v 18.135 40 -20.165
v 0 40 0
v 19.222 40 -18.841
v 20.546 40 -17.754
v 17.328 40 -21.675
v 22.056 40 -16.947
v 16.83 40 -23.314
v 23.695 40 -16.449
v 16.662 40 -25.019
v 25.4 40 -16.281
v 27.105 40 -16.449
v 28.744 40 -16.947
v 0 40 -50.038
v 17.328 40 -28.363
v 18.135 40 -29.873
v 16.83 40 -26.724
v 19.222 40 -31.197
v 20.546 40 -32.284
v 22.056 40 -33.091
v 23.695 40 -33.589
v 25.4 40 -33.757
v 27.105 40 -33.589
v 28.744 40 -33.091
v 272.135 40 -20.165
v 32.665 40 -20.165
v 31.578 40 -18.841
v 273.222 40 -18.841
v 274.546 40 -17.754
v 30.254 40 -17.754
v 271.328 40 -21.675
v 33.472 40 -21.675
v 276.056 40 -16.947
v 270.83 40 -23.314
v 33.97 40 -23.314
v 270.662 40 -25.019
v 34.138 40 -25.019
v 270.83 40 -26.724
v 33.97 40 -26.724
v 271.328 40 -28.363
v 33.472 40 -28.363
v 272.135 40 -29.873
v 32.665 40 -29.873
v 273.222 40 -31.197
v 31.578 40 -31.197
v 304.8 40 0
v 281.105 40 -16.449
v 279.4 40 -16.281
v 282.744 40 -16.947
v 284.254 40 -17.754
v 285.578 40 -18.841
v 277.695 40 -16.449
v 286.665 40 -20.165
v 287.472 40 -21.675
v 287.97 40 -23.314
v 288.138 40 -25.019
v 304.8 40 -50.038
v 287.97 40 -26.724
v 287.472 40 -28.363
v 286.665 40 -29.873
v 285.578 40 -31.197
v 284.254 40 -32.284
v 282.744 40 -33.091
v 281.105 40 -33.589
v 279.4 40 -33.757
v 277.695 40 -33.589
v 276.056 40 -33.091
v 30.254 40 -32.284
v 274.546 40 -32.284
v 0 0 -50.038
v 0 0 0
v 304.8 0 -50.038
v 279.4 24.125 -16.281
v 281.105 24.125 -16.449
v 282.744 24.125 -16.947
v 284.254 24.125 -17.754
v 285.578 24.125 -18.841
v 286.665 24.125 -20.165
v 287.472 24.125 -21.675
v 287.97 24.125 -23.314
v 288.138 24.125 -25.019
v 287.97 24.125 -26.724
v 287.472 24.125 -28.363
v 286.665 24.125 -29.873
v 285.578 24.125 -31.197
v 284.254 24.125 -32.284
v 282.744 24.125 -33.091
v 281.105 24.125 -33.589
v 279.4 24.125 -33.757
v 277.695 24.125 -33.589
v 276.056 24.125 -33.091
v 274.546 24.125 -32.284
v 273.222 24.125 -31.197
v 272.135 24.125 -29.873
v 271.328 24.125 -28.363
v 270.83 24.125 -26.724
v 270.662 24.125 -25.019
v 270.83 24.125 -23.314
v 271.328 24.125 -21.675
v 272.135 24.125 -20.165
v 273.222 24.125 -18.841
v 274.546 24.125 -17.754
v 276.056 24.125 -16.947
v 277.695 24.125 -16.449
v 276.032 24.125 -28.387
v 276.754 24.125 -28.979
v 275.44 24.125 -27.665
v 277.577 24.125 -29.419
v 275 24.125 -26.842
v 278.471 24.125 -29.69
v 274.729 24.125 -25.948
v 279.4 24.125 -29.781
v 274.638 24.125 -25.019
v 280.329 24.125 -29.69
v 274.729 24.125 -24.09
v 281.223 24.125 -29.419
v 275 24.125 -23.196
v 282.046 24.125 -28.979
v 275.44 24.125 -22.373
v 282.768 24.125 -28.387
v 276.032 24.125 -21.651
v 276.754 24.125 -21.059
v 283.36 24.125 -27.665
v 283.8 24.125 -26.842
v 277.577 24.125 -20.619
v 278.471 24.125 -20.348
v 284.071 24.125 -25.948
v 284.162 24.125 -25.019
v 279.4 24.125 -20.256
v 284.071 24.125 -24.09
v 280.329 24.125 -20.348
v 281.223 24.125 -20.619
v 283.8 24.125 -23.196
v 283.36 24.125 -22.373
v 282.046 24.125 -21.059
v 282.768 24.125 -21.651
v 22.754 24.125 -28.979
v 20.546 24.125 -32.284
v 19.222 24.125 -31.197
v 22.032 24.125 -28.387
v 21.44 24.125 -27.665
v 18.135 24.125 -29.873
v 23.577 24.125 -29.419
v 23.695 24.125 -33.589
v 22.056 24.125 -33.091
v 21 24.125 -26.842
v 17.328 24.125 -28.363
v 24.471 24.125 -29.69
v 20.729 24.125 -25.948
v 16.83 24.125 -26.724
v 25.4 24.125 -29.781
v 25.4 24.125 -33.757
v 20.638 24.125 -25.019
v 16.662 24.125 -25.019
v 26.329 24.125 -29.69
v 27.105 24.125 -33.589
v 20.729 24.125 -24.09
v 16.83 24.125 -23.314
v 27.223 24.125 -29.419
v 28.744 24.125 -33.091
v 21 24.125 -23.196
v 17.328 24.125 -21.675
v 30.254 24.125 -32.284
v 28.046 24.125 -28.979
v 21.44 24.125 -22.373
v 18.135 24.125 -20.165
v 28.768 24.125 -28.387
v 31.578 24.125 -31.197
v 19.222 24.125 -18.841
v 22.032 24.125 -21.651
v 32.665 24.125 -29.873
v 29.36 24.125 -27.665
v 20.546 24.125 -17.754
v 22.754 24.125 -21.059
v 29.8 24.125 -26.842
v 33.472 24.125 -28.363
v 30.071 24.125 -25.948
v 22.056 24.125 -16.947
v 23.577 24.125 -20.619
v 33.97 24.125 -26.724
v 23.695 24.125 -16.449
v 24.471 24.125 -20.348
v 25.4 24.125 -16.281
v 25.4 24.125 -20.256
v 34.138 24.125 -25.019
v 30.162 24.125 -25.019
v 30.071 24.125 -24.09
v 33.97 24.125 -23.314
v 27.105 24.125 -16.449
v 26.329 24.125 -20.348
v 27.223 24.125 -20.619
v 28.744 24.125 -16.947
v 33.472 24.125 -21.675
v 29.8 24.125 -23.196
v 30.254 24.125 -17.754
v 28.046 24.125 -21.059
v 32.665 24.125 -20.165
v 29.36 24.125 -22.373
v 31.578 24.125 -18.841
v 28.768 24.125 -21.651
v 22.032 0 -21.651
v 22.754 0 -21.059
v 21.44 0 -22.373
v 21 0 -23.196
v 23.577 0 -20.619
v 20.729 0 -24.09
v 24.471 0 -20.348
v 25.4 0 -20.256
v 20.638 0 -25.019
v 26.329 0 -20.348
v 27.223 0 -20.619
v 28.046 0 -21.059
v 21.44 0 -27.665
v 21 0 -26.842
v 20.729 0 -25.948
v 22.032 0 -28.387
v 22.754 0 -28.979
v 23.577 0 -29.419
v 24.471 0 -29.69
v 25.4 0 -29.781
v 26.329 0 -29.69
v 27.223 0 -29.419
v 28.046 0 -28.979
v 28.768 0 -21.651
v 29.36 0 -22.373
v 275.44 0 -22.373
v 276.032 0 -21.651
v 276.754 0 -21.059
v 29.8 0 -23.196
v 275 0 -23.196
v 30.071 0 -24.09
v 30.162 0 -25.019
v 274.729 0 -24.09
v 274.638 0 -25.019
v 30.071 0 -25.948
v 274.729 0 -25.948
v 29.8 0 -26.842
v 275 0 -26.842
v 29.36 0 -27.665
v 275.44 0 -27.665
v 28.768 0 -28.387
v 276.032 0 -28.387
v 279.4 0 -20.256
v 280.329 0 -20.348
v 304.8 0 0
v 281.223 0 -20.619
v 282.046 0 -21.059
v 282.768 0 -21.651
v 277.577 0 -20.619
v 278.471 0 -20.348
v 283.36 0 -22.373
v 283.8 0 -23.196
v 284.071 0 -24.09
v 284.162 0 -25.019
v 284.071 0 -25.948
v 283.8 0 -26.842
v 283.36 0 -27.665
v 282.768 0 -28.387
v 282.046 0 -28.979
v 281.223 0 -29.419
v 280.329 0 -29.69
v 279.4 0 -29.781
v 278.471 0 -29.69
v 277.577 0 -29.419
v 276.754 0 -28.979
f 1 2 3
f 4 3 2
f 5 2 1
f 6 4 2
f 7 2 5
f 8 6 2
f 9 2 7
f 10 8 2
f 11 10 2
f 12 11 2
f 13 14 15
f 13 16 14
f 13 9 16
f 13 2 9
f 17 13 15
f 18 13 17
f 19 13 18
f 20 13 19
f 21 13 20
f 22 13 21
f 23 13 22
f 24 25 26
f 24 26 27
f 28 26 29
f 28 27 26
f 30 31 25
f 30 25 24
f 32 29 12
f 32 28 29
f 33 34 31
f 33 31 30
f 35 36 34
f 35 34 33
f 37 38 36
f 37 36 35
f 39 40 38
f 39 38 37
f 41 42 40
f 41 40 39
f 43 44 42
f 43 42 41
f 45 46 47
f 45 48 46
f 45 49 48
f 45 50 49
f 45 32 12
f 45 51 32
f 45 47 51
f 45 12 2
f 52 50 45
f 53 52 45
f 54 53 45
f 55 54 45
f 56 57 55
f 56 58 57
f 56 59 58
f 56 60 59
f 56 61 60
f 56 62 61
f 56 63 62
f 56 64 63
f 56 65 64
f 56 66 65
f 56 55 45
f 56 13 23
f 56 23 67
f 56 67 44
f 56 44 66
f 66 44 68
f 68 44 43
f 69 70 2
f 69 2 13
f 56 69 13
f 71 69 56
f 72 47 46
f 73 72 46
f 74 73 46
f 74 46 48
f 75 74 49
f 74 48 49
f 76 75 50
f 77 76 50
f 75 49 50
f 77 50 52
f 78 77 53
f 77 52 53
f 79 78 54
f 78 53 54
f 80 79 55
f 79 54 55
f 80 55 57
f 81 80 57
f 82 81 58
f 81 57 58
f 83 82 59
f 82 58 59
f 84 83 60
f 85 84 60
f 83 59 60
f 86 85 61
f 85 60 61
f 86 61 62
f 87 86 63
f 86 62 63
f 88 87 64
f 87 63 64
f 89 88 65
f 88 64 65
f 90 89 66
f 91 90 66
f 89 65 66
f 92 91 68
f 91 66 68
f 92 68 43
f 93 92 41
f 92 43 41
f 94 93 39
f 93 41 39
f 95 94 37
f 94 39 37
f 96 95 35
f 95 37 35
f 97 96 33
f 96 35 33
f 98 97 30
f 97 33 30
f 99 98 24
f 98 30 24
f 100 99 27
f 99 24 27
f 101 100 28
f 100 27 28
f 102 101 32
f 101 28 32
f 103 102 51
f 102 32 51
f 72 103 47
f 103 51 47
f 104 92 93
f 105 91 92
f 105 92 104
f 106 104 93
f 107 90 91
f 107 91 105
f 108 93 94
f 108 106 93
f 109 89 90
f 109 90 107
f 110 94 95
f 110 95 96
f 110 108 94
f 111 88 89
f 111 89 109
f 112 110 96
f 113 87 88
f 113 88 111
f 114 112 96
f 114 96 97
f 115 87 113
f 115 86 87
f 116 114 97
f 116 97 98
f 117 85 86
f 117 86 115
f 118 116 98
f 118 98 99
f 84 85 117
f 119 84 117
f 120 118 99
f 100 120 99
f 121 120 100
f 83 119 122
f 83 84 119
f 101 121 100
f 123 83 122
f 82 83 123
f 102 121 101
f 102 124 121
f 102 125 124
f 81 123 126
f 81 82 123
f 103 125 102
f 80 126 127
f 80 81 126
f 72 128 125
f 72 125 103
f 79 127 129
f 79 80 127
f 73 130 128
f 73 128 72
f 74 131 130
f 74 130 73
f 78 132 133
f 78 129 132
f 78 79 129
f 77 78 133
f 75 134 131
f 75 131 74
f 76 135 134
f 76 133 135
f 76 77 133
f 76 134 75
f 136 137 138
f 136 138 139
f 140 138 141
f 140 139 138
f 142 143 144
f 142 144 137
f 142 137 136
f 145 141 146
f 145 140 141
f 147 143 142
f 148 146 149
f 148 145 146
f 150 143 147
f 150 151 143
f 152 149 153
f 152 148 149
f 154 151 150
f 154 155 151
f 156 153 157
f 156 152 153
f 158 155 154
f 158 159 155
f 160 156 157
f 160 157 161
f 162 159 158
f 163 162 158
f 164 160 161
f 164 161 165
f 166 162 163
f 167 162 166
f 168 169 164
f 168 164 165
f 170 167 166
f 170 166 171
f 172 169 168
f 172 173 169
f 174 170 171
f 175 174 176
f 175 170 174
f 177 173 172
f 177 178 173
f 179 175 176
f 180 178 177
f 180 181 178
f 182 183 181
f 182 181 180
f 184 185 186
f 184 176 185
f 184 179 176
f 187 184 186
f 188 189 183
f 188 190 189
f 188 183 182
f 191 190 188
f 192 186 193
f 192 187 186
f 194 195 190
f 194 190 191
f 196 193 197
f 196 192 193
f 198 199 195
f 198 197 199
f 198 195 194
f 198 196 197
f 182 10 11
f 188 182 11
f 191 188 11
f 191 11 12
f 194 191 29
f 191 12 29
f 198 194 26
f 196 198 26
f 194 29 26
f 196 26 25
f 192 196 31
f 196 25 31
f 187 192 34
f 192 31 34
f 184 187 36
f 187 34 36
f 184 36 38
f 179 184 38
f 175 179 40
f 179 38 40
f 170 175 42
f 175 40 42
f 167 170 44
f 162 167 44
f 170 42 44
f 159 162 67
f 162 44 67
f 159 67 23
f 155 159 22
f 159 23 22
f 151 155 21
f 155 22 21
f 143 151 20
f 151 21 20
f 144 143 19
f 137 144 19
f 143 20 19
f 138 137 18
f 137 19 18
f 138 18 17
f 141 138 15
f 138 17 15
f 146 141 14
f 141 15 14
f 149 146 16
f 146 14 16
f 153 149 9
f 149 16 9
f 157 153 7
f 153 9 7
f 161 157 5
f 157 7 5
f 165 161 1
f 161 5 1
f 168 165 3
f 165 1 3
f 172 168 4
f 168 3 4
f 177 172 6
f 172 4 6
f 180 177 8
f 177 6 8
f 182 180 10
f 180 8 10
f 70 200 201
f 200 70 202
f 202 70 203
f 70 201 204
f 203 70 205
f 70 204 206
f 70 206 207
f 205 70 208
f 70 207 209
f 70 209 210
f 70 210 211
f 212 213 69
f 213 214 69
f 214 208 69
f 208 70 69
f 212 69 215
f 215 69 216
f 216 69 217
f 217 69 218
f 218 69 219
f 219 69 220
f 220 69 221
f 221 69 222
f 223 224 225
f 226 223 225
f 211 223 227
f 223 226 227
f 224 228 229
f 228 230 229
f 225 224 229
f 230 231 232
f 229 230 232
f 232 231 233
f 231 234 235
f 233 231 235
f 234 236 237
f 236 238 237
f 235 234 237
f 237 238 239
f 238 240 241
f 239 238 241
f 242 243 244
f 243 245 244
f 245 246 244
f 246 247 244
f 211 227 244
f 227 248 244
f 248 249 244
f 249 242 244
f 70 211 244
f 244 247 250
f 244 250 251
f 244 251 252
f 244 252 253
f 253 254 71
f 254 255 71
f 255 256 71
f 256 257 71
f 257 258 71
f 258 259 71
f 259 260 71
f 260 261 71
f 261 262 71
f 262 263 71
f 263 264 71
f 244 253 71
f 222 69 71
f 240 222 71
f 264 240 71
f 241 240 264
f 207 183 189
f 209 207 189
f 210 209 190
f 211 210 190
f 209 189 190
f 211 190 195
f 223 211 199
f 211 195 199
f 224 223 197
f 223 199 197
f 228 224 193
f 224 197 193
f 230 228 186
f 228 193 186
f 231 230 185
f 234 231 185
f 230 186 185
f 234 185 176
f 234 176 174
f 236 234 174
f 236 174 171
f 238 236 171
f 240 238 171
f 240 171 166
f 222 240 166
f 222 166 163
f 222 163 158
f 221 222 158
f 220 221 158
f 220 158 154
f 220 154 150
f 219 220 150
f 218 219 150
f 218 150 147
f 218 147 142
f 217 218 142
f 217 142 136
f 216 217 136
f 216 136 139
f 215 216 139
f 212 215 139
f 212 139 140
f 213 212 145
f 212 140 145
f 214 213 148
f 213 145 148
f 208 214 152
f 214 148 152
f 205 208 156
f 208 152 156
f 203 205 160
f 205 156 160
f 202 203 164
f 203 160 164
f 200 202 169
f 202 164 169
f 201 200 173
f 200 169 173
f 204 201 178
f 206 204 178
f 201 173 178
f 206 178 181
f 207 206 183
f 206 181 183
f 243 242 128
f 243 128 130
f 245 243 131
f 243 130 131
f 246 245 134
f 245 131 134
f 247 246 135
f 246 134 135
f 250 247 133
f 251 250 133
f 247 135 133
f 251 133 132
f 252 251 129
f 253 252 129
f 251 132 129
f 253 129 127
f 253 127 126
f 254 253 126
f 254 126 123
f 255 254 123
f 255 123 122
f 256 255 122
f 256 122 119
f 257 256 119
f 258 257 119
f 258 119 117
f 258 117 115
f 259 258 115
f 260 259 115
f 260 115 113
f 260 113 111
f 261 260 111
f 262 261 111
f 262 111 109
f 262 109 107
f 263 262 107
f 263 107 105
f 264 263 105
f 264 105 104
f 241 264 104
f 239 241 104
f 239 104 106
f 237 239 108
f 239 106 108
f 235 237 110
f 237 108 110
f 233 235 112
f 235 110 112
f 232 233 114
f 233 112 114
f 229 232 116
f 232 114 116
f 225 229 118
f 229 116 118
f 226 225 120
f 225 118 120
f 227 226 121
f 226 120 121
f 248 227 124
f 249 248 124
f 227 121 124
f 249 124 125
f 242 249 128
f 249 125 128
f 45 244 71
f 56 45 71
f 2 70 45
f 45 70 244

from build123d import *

# Parameters (mm, degrees)
BOSS_EXTRUDE2_OUTLINE_W = 304.8
BOSS_EXTRUDE2_OUTLINE_H = 50.038
BOSS_EXTRUDE2_DEPTH     = 39.99992
SKETCH3_R               = 4.7625
CUT_EXTRUDE1_DEPTH      = 312.459202856
SKETCH4_R               = 8.7376
CUT_EXTRUDE2_DEPTH      = 15.875


# Read off the part's stored shape, not the designer's step: Boss-Extrude2
with BuildPart() as part:
    # Boss-Extrude2 outline → Boss-Extrude2 (new body)
    with BuildSketch(Plane(origin=(0, 0, 0), x_dir=(1, 0, 0), z_dir=(0, 1, 0))):
        with Locations((152.4, 25.019)):
            Rectangle(BOSS_EXTRUDE2_OUTLINE_W, BOSS_EXTRUDE2_OUTLINE_H)
    extrude(amount=BOSS_EXTRUDE2_DEPTH)

    # Sketch3 → Cut-Extrude1 (cut, through all)
    with BuildSketch(Plane(origin=(0, 39.99992, 0), x_dir=(1, 0, 0), z_dir=(0, 1, 0))):
        with Locations(Location((279.4, 25.019, 0), (0, 0, 270))):
            Circle(SKETCH3_R)
        with Locations(Location((25.4, 25.019, 0), (0, 0, 270))):
            Circle(SKETCH3_R)
    extrude(amount=-CUT_EXTRUDE1_DEPTH, mode=Mode.SUBTRACT)

    # Sketch4 → Cut-Extrude2 (cut)
    with BuildSketch(Plane(origin=(0, 39.99992, 0), x_dir=(1, 0, 0), z_dir=(0, 1, 0))):
        with Locations(Location((279.4, 25.019, 0), (0, 0, 270))):
            Circle(SKETCH4_R)
        with Locations(Location((25.4, 25.019, 0), (0, 0, 270))):
            Circle(SKETCH4_R)
    extrude(amount=-CUT_EXTRUDE2_DEPTH, mode=Mode.SUBTRACT)


solid = part.part
